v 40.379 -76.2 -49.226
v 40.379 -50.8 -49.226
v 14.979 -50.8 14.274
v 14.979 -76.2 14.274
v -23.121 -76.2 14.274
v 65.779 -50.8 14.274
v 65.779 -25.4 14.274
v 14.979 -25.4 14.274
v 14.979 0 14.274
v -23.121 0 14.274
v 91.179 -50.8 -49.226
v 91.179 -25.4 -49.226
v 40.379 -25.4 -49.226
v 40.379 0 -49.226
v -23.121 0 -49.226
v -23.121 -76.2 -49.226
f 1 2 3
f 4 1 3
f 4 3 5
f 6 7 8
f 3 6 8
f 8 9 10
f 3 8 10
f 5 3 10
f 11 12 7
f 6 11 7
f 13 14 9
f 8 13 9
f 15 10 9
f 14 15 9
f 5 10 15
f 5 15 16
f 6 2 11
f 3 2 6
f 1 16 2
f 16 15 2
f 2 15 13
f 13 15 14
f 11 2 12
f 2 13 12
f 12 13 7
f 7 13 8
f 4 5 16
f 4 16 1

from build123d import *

# Parameters (mm, degrees)
F1_DEPTH = 76.2
F2_W     = 25.4
F2_H     = 63.5
F3_DEPTH = 114.3
F5_DEPTH = 25.4


with BuildPart() as f1:
    # F0 (on Front) → F1 (new body)
    with BuildSketch(Plane.XZ):
        Polygon((-23.121473, 14.273803), (-23.121473, -49.226197), (40.378527, -49.226197), (14.978527, 14.273803), align=None)
    extrude(amount=F1_DEPTH)

    # F2 (on face) → F3 (join)
    with BuildSketch(Plane(origin=(-23.121473, 0, 0), x_dir=(0, -1, 0), z_dir=(-1, 0, 0))):
        with Locations((38.1, -17.476197)):
            Rectangle(F2_W, F2_H)
    extrude(amount=-F3_DEPTH)

    # F4 (on face) → F5 (cut)
    with BuildSketch(Plane(origin=(0, -25.4, 0), x_dir=(-1, 0, 0), z_dir=(0, 1, 0))):
        Polygon((-91.178527, -49.226197), (-65.778527, 14.273803), (-91.178527, 14.273803), align=None)
    extrude(amount=-F5_DEPTH, mode=Mode.SUBTRACT)


solid = f1.part
